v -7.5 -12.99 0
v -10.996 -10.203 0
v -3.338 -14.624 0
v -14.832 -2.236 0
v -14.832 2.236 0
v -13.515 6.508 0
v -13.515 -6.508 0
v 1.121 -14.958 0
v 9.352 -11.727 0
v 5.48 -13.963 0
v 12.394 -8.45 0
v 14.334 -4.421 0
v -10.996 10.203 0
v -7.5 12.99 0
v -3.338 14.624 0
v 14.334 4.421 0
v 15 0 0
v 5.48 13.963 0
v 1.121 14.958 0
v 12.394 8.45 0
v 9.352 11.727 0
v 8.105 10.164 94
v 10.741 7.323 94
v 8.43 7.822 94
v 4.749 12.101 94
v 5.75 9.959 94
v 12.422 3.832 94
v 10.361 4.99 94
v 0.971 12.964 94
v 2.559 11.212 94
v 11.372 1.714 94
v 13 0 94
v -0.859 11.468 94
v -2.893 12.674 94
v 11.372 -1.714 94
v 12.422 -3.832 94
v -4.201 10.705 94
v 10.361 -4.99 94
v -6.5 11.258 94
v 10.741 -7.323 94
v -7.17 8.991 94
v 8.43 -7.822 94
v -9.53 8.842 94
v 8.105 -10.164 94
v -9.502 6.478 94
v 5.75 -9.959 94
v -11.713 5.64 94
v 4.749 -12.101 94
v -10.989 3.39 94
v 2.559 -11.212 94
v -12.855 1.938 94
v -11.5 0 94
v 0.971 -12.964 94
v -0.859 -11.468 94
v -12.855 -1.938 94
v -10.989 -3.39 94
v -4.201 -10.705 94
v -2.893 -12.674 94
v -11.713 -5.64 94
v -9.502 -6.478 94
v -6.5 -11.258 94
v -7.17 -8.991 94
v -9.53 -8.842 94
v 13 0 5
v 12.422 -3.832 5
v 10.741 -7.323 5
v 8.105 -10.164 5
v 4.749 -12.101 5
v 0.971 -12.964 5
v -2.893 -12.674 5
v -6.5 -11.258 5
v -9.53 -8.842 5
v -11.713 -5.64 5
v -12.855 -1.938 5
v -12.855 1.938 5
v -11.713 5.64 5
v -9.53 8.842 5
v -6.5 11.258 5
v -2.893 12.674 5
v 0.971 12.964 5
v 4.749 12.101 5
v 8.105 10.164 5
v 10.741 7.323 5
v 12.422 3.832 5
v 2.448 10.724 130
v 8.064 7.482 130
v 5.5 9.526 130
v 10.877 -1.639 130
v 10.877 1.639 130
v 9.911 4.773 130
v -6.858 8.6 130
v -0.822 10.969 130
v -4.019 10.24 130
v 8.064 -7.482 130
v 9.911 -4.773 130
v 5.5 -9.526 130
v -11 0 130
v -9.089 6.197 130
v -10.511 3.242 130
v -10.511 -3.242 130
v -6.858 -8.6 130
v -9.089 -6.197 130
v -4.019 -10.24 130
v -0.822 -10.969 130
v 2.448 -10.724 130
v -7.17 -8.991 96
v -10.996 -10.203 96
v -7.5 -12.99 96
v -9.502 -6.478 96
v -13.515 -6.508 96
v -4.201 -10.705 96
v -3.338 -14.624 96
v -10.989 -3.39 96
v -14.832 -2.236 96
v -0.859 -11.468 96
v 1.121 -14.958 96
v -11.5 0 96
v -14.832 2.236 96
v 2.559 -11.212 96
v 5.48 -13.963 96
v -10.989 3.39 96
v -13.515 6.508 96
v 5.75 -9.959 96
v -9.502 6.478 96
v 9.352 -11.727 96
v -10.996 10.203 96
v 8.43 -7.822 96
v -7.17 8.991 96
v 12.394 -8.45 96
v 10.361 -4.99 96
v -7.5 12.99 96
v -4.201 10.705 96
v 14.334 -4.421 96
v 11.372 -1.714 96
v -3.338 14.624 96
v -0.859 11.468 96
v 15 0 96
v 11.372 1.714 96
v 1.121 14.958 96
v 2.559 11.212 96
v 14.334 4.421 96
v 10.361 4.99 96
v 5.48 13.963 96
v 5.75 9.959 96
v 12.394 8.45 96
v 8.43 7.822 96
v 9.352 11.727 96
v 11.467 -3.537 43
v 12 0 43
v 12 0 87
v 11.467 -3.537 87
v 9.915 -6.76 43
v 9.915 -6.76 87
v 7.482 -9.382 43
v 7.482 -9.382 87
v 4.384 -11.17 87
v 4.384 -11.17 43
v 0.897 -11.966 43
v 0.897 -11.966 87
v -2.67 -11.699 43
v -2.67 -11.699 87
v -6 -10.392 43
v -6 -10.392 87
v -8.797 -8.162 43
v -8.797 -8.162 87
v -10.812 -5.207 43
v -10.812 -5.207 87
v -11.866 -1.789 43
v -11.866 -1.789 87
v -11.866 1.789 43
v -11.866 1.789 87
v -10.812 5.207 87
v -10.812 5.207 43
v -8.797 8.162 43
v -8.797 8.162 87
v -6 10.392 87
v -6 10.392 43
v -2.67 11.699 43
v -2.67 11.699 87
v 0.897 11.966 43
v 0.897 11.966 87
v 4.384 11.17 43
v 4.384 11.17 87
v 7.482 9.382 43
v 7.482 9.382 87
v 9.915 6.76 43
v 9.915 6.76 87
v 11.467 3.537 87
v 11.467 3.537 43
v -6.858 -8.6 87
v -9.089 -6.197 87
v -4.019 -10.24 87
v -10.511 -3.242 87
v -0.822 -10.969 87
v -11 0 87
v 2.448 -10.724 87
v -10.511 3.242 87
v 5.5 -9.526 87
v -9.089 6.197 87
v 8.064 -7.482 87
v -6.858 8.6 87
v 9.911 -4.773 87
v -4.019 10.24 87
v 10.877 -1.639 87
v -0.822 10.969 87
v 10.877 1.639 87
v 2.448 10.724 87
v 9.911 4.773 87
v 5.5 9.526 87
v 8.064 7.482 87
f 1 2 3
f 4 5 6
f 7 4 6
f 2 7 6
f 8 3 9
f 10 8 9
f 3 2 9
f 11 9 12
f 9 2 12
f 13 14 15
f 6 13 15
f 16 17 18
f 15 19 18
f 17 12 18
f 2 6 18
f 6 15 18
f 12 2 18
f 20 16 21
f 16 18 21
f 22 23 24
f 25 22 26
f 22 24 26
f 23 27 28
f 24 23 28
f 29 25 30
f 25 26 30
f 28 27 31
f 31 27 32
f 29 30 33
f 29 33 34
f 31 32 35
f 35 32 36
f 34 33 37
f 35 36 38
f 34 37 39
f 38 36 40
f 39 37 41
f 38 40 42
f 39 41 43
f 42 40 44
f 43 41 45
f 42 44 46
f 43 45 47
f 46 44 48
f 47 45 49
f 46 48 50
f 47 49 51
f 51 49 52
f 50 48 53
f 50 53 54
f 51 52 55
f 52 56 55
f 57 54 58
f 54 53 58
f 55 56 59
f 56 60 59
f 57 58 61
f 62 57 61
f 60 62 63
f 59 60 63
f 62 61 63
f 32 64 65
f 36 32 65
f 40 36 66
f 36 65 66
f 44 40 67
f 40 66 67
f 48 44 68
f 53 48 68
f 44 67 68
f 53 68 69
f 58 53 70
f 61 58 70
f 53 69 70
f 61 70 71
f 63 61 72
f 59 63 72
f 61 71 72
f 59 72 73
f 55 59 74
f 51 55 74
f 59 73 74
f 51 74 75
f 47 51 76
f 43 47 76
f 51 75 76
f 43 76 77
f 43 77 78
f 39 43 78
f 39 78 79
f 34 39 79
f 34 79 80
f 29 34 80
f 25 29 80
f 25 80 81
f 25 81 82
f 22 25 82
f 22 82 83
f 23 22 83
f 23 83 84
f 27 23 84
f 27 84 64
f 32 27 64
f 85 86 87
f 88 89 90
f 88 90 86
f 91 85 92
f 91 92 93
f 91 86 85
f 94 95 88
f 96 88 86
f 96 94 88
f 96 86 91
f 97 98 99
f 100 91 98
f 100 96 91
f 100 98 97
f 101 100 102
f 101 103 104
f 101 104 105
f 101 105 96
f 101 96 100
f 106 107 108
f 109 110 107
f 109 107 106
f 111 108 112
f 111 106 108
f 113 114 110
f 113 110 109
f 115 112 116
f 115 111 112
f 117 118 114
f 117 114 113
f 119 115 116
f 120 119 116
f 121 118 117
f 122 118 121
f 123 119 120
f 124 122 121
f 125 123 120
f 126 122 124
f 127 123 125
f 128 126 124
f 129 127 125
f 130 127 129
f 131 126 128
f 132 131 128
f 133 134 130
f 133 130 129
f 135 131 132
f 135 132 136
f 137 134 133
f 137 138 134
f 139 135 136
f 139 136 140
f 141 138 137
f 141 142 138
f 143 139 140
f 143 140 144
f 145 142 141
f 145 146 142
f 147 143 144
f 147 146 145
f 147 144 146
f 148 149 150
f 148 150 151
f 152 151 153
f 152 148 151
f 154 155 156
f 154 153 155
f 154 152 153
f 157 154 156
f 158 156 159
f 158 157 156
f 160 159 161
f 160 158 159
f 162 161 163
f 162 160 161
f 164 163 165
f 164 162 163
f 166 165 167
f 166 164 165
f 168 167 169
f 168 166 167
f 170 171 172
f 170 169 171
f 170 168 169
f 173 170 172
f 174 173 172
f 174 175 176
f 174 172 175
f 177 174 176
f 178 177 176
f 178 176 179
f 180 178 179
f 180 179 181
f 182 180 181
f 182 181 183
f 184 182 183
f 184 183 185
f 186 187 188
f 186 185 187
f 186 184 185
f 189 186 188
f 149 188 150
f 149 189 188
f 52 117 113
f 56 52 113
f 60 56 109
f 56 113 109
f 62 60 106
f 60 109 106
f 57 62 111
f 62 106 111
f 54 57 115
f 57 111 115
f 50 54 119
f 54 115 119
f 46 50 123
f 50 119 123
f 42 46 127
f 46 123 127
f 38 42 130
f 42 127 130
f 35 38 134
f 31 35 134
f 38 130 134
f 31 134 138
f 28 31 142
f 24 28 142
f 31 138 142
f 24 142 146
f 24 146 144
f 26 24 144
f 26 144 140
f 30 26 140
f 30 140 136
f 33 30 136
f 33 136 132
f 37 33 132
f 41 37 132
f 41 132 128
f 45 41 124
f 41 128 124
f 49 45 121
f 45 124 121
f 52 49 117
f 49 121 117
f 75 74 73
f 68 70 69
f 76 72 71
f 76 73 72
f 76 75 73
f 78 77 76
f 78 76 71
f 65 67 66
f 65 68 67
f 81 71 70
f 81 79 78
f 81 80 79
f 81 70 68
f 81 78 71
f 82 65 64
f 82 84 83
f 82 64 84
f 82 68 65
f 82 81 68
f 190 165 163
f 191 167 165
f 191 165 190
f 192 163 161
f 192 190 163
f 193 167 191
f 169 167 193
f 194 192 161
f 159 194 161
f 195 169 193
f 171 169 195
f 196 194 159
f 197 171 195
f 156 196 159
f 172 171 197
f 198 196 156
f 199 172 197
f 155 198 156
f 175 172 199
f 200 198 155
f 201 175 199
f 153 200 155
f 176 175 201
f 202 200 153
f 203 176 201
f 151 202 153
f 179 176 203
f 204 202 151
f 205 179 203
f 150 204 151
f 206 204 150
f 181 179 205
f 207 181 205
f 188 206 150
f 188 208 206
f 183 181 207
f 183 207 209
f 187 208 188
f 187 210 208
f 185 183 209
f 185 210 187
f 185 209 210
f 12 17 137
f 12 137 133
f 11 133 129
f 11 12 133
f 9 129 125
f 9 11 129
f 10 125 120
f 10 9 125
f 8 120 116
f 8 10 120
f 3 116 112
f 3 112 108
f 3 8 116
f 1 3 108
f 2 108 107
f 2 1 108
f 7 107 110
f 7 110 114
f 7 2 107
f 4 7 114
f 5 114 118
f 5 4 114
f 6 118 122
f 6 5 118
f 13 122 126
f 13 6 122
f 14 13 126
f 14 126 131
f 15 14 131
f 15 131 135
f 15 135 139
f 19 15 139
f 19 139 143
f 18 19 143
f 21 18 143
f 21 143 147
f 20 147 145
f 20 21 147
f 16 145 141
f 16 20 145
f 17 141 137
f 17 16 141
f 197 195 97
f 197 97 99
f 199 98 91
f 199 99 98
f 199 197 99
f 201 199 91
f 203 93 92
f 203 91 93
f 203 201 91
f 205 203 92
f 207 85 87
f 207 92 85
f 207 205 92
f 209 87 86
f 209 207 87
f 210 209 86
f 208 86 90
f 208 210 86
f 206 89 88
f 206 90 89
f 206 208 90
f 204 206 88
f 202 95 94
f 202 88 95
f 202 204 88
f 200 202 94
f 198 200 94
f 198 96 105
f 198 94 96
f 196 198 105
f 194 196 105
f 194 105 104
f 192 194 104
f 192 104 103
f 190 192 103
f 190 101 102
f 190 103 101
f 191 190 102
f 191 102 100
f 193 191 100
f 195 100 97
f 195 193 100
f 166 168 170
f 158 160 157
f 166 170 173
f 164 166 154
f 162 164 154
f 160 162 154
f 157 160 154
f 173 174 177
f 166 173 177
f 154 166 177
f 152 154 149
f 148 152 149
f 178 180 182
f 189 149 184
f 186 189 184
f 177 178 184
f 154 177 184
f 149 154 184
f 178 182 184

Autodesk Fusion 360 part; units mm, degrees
sketch "Sketch1" plane through (0, 0, 0) normal (0, 0, 1) x (1, 0, 0)
  circle A0 centre (0, 0) radius 15
  circle A1 centre (0, 0) radius 13
  circle A2 centre (0, 0) radius 10
  circle A3 centre (0, 0) radius 11.5
  dimension "d1" = 30
  dimension "d2" = 2
  dimension "d3" = 20
  dimension "d5" = 1.5
extrude "Extrude1" add sketch "Sketch1" along normal blind 5 contours A0 | A1 | A2 | A3 makes body 1
extrude "Extrude2" add sketch "Sketch1" along normal blind 96 contours A0 bodies 1
ref_plane "WorkPlane2" through (0, 0, 43) normal (0, 0, 1) x (1, 0, 0)
sketch "Sketch3" plane through (0, 0, 43) normal (0, 0, 1) x (1, 0, 0)
  circle A0 centre (0, 0) radius 12
  dimension "d12" = 24
sketch "Sketch4" plane through (0, 0, 43) normal (0, 0, 1) x (1, 0, 0)
extrude "Extrude3" add sketch "Sketch3" along normal blind 44 separate body makes body 2
sketch "Sketch5" plane through (0, 0, 96) normal (0, 0, 1) x (-1, 0, 0)
  circle A0 centre (0, 0) radius 13
  circle A1 centre (0, 0) radius 15
  circle A2 centre (0, 0) radius 15
extrude "Extrude4" add sketch "Sketch5" against normal blind 2 contours A0 | A1 A2 bodies 1
sketch "Sketch6" plane through (0, 0, 96) normal (0, 0, 1) x (-1, 0, 0)
  circle A0 centre (0, 0) radius 15
  circle A1 centre (0, 0) radius 11.5
  dimension "d17" = 23
extrude "Extrude5" cut sketch "Sketch6" against normal blind 3 contours A1 bodies 1
sketch "Sketch7" plane through (0, 0, 87) normal (0, 0, 1) x (-1, 0, 0)
  circle A0 centre (0, 0) radius 12
  circle A1 centre (0, 0) radius 11
  dimension "d22" = 22
extrude "Extrude6" add sketch "Sketch7" along normal blind 43 contours A1 bodies 2
